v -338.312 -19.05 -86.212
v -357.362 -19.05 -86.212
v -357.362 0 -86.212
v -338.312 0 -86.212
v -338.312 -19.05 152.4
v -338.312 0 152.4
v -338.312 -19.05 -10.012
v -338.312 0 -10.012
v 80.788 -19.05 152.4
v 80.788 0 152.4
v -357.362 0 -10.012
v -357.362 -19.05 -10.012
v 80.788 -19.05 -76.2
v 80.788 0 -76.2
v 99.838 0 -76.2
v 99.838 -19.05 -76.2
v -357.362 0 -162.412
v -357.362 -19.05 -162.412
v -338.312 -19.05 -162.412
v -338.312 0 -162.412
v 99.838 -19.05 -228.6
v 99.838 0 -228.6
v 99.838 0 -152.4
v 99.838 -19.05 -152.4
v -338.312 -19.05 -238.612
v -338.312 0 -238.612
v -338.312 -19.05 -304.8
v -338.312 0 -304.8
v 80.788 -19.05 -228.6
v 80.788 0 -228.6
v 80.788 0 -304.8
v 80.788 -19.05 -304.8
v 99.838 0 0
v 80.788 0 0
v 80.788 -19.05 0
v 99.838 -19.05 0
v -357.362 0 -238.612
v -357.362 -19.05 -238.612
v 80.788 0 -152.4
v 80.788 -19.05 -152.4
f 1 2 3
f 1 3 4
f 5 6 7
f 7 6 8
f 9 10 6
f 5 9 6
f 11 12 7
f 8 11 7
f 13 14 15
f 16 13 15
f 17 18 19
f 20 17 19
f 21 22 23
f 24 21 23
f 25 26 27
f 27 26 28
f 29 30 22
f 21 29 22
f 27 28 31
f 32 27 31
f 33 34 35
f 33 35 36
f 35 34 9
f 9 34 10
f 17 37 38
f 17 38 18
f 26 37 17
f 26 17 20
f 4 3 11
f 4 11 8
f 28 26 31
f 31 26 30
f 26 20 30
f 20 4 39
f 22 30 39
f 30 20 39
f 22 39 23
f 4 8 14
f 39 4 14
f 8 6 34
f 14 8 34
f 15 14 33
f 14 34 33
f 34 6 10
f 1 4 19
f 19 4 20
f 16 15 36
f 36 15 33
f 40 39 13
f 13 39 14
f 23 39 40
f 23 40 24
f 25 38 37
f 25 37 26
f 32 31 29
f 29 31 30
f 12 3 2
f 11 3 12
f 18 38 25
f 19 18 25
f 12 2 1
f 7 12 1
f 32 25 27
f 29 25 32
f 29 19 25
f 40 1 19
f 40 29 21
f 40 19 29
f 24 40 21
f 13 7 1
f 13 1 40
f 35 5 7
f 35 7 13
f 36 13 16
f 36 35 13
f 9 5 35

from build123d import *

# Parameters (mm, degrees)
F0_W     = 19.05
F0_H     = 76.2
F1_DEPTH = 19.05


with BuildPart() as f1:
    # F0 (on Front) → F1 (new body)
    with BuildSketch(Plane.XZ):
        Polygon((80.788266, 152.4), (-338.311734, 152.4), (-338.311734, -10.011766), (-338.311734, -86.211766), (-338.311734, -162.411766), (-338.311734, -238.611766), (-338.311734, -304.8), (80.788266, -304.8), (80.788266, -228.6), (80.788266, -152.4), (80.788266, -76.2), (80.788266, 0), (80.788266, 76.2), align=None)
        with Locations((-347.836734, -48.111766)):
            Rectangle(F0_W, F0_H)
        with Locations((-347.836734, -200.511766)):
            Rectangle(F0_W, F0_H)
        with Locations((90.313266, -38.1)):
            Rectangle(F0_W, F0_H)
        with Locations((90.313266, -190.5)):
            Rectangle(F0_W, F0_H)
    extrude(amount=F1_DEPTH)


solid = f1.part
